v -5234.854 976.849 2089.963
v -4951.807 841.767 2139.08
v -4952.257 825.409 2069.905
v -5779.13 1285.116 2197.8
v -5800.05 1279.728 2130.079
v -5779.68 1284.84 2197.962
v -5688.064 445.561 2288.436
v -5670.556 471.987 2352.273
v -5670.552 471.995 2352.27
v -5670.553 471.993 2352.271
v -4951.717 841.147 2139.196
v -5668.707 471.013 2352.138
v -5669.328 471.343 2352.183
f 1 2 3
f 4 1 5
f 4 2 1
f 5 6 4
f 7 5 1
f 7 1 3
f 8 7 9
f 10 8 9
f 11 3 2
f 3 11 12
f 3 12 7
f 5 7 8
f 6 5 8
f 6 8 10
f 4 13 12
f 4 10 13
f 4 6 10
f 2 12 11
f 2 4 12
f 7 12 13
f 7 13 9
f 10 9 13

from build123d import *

# Parameters (mm, degrees)
BOSS_EXTRUDE1_DEPTH = 70
CHAMFER1_SIZE2      = 4.18941816
CHAMFER1_SIZE       = 70
CHAMFER2_SIZE       = 6.666257335
CHAMFER2_SIZE_2     = 70
CUT_EXTRUDE1_DEPTH  = 10
CUT_EXTRUDE2_DEPTH  = 10
SKETCH4_W           = 287.422720902
SKETCH4_H           = 893.518312169
CUT_EXTRUDE3_DEPTH  = 10


# Some blends are built 0.0001 mm under size
with BuildPart() as part:
    # Sketch1 → Boss-Extrude1 (new body)
    with BuildSketch(Plane(origin=(231.948409601, 267.750179411, 1224.939426156), x_dir=(0.9836670614243895, -0.018848869033306223, -0.17900791157061058), z_dir=(0.17900684147746093, 0.20663786272562784, 0.9619029807586875))):
        Polygon((-6114.579700227, 916.675736405), (-6017.047344534, 65.828535372), (-5261.298623968, 468.69003921), align=None)
    extrude(amount=BOSS_EXTRUDE1_DEPTH)

    # Chamfer1
    chamfer1_edges = [part.edges().sort_by_distance(p)[0] for p in [
        (-5363.622839272, 1067.033331681, 2167.324875996),
    ]]
    chamfer1_side = [part.faces().sort_by_distance(p)[0] for p in [
        (-5363.637837962, 1067.016017832, 2167.24427972),
    ]]
    chamfer(chamfer1_edges, length=CHAMFER1_SIZE - 0.0001, length2=CHAMFER1_SIZE2 - 0.0001, reference=chamfer1_side[0])  # a hair under: the kernel refuses the full size

    # Chamfer2
    # the kernel refuses this chamfer: 70, 6.666257335 mm, written as the material it takes off along each edge
    with BuildSketch(Plane(origin=(-5831.876326045, 379.315966254, 2402.202019272), x_dir=(-0.37796472427930605, 0.8862370425990936, 0.267818168774414), z_dir=(0.8591676949824762, 0.4435312395800335, -0.255168398151295))) as chamfer2_piece_1:
        Polygon((CHAMFER2_SIZE * 0.92779638202, -CHAMFER2_SIZE * 0.373086951719), (-CHAMFER2_SIZE_2 * 0.373086951713, -CHAMFER2_SIZE_2 * 0.927796382005), (0, 0), align=None)
    extrude(amount=1215.290815937, mode=Mode.SUBTRACT)
    with BuildSketch(Plane(origin=(-5810.651127776, 1466.498755071, 2164.701368848), x_dir=(-0.1825618043812556, -0.20697447902057858, -0.9611621885068203), z_dir=(0.13076019619656676, -0.9740181607293223, 0.184906445696475))) as chamfer2_piece_2:
        Polygon((CHAMFER2_SIZE_2 * 0.999993350078, CHAMFER2_SIZE_2 * 0.00364688918346), (-CHAMFER2_SIZE * 0.00364688918357, CHAMFER2_SIZE * 0.999993350094), (0, 0), align=None)
    extrude(amount=1215.290815937, mode=Mode.SUBTRACT)

    # Sketch2 → Cut-Extrude1 (cut)
    with BuildSketch(Plane(origin=(-1155.31957462, -2341.467412338, 1286.584724908), x_dir=(0.9178561698216066, -0.3478582739738773, 0.1911404529353356), z_dir=(-0.39691315362483304, -0.8044174401239645, 0.4420096497860625))):
        Polygon((-4919.324722598, 2288.84825515), (-4917.313875734, 2288.259664395), (-4938.404193289, 2220.173354917), align=None)
    extrude(amount=CUT_EXTRUDE1_DEPTH, mode=Mode.SUBTRACT)

    # Sketch3 → Cut-Extrude2 (cut)
    with BuildSketch(Plane(origin=(-4820.811559407, -663.513212633, 188.265036569), x_dir=(-0.038297874166628845, -0.005271134374818051, -0.9992524645837606), z_dir=(0.9899202066384638, 0.1362478347188717, -0.03865891906507896))):
        Polygon((-2346.226398356, 930.896979041), (-1894.241052266, 2187.396241778), (-1814.981817773, 1495.770397412), align=None)
    extrude(amount=CUT_EXTRUDE2_DEPTH, mode=Mode.SUBTRACT)

    # Sketch4 → Cut-Extrude3 (cut)
    with BuildSketch(Plane(origin=(-1646.015630594, 3413.926203867, 236.836708654), x_dir=(0.9011742428578655, 0.43241771341973545, 0.029998418798336916), z_dir=(-0.43345701518092067, 0.8990134934757245, 0.06236789670191585))):
        with Locations((-4715.577586911, -1688.111490452)):
            Rectangle(SKETCH4_W, SKETCH4_H)
    extrude(amount=CUT_EXTRUDE3_DEPTH, mode=Mode.SUBTRACT)


solid = part.part
